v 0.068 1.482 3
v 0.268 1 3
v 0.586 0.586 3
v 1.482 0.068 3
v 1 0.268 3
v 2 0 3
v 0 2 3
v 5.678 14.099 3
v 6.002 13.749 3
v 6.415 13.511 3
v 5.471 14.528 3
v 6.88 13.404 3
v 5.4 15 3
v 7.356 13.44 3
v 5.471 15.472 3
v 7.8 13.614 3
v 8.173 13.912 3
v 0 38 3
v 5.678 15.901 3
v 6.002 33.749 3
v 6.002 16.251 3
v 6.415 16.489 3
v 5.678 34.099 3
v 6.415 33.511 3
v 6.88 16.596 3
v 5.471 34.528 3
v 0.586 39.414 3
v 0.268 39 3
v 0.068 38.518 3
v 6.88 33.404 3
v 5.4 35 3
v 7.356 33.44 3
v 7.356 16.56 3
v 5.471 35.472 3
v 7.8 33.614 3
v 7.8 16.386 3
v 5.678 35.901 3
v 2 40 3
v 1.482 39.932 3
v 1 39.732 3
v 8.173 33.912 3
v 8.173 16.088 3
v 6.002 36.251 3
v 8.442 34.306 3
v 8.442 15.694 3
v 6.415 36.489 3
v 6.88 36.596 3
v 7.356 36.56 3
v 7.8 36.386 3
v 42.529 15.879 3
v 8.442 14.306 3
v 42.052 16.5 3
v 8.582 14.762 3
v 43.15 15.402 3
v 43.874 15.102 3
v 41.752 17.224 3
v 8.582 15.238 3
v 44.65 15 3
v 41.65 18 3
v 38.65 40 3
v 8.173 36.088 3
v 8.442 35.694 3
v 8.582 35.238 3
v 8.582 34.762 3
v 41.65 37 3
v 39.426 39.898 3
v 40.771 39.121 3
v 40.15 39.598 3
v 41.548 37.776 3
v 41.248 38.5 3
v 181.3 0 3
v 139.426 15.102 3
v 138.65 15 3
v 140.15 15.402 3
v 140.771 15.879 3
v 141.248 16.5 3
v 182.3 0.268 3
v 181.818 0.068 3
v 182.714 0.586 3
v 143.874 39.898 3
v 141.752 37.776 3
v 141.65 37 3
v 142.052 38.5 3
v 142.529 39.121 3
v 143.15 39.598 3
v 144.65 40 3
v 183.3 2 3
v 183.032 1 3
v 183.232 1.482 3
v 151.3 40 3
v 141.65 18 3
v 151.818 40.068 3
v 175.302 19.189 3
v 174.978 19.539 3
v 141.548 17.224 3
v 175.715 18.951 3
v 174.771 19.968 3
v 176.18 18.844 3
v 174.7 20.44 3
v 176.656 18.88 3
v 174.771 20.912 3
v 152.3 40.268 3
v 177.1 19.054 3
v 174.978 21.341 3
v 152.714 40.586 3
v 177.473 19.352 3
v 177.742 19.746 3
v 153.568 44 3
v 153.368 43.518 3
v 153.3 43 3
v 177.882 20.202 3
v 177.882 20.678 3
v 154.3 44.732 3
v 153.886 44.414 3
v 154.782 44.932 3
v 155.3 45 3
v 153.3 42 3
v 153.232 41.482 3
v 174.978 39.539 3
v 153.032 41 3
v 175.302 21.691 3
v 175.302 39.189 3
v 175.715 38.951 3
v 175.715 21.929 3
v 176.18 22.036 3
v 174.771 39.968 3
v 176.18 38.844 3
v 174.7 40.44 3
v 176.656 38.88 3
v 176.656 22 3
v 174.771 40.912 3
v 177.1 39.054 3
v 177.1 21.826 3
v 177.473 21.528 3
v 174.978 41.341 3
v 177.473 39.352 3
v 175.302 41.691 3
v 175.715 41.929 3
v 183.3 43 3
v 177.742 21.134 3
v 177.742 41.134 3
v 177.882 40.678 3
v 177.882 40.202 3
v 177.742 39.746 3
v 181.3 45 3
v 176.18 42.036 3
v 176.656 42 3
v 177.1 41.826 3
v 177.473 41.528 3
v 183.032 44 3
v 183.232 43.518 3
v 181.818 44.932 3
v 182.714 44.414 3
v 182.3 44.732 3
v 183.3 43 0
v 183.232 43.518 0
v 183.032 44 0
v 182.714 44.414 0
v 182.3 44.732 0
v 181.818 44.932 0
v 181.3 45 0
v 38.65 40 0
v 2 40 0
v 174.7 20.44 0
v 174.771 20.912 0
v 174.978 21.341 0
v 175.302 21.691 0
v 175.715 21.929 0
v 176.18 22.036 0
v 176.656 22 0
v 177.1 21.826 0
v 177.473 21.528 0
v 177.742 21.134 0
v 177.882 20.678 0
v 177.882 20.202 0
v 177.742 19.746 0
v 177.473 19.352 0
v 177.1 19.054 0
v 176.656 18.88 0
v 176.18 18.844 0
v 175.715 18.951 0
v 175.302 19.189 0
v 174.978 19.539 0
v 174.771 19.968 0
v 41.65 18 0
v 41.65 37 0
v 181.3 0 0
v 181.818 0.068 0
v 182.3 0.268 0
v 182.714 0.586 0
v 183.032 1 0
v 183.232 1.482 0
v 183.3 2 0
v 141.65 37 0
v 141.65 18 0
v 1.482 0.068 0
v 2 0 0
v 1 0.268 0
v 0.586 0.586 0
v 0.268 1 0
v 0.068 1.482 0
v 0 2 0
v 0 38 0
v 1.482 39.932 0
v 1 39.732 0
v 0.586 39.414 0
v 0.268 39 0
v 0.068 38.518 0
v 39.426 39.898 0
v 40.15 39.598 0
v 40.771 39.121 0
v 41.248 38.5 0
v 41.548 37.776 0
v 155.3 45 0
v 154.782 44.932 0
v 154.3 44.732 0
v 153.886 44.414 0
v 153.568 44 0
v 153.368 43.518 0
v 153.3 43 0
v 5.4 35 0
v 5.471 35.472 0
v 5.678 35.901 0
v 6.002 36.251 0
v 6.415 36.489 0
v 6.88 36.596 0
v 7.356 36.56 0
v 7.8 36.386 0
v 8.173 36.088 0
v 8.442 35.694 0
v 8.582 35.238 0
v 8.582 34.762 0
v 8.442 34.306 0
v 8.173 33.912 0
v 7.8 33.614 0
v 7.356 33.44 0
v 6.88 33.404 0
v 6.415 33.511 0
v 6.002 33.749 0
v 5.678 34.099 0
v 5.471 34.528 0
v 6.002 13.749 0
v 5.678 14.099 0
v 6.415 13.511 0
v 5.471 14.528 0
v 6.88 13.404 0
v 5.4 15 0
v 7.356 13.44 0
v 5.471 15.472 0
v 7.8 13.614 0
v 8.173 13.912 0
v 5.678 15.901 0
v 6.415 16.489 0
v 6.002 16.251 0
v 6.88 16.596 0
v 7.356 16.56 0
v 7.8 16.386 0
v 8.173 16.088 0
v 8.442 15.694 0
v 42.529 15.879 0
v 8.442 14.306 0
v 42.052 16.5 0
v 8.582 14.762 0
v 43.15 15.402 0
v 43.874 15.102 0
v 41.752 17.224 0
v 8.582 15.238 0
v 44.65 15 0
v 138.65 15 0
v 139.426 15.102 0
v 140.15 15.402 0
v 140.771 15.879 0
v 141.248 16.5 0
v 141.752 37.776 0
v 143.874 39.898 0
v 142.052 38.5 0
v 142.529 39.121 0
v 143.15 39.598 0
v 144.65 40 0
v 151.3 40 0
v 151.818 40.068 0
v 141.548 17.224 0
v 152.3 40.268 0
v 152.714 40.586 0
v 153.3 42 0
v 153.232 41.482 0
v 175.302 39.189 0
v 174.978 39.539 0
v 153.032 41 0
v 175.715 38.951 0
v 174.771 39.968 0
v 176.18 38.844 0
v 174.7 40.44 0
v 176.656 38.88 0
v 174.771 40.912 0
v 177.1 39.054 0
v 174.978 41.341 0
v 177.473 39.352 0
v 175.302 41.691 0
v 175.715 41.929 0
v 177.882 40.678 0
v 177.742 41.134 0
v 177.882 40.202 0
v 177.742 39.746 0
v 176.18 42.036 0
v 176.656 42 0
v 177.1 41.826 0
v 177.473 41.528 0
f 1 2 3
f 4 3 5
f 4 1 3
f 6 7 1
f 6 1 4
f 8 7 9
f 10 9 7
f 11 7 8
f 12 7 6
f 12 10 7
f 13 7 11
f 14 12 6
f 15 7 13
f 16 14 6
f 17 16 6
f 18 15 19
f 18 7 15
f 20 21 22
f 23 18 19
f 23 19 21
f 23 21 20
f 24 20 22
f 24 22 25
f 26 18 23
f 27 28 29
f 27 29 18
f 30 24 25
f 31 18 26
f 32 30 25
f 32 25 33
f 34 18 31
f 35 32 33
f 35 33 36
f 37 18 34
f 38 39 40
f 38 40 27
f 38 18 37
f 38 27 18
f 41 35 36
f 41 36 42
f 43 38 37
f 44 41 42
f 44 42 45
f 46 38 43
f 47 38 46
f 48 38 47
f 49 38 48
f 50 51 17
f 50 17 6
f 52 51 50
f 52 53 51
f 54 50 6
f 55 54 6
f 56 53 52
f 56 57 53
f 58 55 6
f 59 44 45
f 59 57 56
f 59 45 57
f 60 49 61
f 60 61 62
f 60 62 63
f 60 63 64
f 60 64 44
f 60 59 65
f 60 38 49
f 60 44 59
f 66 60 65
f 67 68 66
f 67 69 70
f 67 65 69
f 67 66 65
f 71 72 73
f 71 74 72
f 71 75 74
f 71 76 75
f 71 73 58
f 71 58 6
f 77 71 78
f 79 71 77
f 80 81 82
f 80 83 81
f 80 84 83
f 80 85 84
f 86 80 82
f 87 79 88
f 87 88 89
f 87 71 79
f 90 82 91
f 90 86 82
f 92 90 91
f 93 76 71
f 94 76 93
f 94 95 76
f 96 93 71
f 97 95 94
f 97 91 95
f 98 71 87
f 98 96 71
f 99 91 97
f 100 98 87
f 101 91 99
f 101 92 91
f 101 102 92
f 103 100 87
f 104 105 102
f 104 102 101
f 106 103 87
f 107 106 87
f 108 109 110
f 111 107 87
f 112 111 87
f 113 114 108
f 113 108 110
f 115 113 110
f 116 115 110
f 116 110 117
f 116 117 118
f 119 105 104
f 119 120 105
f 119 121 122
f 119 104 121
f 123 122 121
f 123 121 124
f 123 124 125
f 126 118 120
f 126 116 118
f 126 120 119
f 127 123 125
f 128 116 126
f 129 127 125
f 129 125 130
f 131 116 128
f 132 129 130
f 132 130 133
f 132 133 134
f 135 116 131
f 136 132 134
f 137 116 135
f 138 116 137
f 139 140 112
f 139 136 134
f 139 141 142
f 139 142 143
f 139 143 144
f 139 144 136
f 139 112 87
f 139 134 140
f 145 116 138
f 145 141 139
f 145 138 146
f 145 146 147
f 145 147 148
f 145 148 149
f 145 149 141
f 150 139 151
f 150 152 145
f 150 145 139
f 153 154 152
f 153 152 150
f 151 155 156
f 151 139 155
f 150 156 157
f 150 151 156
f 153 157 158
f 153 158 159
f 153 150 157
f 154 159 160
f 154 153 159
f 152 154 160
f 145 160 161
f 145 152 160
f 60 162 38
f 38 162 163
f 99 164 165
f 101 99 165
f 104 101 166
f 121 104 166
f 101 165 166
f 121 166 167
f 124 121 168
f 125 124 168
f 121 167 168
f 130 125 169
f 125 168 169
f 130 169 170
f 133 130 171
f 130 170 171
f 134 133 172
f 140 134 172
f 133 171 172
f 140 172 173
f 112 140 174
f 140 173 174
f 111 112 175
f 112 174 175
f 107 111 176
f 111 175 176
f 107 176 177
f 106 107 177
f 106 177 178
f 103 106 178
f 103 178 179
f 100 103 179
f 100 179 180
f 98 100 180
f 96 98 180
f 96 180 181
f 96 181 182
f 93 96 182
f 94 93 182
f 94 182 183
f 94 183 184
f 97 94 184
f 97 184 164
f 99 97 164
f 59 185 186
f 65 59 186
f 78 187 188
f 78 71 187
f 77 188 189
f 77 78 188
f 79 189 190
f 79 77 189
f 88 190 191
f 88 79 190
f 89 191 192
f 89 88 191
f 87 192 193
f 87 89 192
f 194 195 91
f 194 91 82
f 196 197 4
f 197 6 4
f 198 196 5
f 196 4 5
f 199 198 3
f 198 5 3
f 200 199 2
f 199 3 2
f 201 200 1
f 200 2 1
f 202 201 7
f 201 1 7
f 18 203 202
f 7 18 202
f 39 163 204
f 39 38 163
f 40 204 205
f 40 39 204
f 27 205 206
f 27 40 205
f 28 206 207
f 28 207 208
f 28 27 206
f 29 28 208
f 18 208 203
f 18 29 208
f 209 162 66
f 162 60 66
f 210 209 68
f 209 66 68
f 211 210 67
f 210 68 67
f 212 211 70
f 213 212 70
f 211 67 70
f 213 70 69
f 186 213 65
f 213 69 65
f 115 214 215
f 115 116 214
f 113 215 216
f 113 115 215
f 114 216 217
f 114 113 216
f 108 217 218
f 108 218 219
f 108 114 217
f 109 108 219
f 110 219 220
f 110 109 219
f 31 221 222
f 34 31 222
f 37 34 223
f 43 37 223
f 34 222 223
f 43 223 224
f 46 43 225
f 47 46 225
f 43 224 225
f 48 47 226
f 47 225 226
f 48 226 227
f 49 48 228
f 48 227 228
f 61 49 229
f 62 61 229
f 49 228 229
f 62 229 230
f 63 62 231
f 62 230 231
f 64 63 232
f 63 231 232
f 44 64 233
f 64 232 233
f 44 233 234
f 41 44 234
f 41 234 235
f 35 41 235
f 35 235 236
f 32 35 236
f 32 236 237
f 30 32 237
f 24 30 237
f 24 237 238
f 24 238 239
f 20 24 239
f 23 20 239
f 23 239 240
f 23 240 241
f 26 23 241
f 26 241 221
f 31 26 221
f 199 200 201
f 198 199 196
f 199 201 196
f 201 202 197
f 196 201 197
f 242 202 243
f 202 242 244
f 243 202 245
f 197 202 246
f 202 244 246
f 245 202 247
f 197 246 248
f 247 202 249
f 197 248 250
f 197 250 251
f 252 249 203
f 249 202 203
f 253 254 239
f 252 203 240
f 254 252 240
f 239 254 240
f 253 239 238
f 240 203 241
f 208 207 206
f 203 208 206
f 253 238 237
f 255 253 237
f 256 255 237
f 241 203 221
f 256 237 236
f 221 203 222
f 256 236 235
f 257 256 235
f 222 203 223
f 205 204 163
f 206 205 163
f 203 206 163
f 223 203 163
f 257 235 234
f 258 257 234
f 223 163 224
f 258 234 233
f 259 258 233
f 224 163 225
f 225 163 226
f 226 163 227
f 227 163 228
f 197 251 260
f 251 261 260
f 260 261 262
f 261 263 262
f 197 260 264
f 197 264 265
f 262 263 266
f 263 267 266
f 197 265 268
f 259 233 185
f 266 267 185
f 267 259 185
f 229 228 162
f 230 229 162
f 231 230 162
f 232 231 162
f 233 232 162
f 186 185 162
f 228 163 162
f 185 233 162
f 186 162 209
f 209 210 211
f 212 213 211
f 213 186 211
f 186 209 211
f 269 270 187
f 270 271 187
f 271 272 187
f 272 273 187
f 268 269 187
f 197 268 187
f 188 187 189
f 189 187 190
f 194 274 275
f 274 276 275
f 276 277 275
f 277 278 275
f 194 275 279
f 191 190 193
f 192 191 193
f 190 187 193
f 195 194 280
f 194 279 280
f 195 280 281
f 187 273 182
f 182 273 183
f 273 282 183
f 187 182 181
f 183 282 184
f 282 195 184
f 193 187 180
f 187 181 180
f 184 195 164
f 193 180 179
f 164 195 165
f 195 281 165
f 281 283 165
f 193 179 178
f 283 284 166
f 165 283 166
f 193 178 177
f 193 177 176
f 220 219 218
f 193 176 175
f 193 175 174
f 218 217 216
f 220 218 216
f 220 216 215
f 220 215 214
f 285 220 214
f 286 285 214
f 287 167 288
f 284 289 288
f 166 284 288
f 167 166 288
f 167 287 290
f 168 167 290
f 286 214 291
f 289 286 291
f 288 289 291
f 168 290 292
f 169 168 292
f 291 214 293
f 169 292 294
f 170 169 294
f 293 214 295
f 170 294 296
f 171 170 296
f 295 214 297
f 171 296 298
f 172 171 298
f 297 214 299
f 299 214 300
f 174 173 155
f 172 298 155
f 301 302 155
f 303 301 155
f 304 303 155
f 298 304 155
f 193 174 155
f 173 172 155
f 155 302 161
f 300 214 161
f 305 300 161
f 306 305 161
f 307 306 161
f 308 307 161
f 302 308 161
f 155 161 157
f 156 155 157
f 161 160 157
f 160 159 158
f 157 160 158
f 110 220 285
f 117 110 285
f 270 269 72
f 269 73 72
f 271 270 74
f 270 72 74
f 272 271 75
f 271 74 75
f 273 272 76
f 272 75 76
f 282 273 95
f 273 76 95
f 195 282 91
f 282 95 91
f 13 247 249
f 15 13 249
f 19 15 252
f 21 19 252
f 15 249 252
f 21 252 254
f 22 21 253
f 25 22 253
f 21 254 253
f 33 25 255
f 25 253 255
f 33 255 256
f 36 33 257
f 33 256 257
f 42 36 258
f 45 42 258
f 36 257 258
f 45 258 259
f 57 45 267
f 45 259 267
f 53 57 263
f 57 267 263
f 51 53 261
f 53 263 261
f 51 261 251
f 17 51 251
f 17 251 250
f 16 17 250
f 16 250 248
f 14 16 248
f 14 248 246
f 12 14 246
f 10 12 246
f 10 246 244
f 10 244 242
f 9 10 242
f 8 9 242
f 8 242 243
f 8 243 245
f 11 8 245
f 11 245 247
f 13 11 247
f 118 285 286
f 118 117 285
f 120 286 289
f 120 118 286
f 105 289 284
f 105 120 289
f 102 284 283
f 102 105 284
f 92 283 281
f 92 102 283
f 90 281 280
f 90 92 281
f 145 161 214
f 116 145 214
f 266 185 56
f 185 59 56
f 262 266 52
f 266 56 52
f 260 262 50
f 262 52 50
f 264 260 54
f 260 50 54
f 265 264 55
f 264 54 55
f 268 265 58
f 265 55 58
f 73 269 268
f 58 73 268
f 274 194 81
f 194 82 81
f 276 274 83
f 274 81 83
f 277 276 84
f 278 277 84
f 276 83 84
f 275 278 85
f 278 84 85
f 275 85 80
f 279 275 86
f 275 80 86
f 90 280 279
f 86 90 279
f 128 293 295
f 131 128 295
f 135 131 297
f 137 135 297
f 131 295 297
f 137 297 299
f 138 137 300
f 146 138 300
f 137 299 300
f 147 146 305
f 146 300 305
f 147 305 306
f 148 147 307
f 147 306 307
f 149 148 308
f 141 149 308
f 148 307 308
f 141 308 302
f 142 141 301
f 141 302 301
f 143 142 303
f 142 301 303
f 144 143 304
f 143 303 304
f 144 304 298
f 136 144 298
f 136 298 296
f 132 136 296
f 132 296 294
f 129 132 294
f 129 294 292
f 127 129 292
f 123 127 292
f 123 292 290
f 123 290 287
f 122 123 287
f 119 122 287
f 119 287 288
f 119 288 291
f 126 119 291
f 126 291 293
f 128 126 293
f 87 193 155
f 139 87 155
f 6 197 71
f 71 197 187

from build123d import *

# Parameters (mm, degrees)
EXTRUDE_1_DEPTH     = 3
FILLET_1_R          = 2
SKETCH_2_R          = 1.6
CUT_EXTRUDE_1_DEPTH = 14
SKETCH_3_W          = 100
SKETCH_3_H          = 25
CUT_EXTRUDE_2_DEPTH = 14
FILLET_2_R          = 3


with BuildPart() as part:
    # 草图1 → 凸台-拉伸1 (new body)
    with BuildSketch(Plane.XY):
        Polygon((0, 0), (183.3, 0), (183.3, 40), (183.3, 45), (153.3, 45), (153.3, 40), (0, 40), align=None)
    extrude(amount=EXTRUDE_1_DEPTH)

    # 圆角1
    fillet_1_edges = [part.edges().sort_by_distance(p)[0] for p in [
        (0, 40, 1.5),
        (153.3, 40, 1.5),
        (153.3, 45, 1.5),
        (183.3, 45, 1.5),
        (183.3, 0, 1.5),
        (0, 0, 1.5),
    ]]
    fillet(fillet_1_edges, radius=FILLET_1_R)

    # 草图2 → 切除-拉伸1 (cut)
    with BuildSketch(Plane(origin=(0, 0, 0), x_dir=(-1, 0, 0), z_dir=(0, 0, -1))):
        with Locations((-176.3, 40.44)):
            Circle(SKETCH_2_R)
        with Locations((-176.3, 20.44)):
            Circle(SKETCH_2_R)
        with Locations((-7, 35)):
            Circle(SKETCH_2_R)
        with Locations((-7, 15)):
            Circle(SKETCH_2_R)
    extrude(amount=-CUT_EXTRUDE_1_DEPTH, mode=Mode.SUBTRACT)

    # 草图3 → 切除-拉伸2 (cut)
    with BuildSketch(Plane(origin=(0, 0, 0), x_dir=(-1, 0, 0), z_dir=(0, 0, -1))):
        with Locations((-91.65, 27.5)):
            Rectangle(SKETCH_3_W, SKETCH_3_H)
    extrude(amount=-CUT_EXTRUDE_2_DEPTH, mode=Mode.SUBTRACT)

    # 圆角2
    fillet_2_edges = [part.edges().sort_by_distance(p)[0] for p in [
        (141.65, 15, 1.5),
        (141.65, 40, 1.5),
        (41.65, 40, 1.5),
        (41.65, 15, 1.5),
    ]]
    fillet(fillet_2_edges, radius=FILLET_2_R)


solid = part.part
